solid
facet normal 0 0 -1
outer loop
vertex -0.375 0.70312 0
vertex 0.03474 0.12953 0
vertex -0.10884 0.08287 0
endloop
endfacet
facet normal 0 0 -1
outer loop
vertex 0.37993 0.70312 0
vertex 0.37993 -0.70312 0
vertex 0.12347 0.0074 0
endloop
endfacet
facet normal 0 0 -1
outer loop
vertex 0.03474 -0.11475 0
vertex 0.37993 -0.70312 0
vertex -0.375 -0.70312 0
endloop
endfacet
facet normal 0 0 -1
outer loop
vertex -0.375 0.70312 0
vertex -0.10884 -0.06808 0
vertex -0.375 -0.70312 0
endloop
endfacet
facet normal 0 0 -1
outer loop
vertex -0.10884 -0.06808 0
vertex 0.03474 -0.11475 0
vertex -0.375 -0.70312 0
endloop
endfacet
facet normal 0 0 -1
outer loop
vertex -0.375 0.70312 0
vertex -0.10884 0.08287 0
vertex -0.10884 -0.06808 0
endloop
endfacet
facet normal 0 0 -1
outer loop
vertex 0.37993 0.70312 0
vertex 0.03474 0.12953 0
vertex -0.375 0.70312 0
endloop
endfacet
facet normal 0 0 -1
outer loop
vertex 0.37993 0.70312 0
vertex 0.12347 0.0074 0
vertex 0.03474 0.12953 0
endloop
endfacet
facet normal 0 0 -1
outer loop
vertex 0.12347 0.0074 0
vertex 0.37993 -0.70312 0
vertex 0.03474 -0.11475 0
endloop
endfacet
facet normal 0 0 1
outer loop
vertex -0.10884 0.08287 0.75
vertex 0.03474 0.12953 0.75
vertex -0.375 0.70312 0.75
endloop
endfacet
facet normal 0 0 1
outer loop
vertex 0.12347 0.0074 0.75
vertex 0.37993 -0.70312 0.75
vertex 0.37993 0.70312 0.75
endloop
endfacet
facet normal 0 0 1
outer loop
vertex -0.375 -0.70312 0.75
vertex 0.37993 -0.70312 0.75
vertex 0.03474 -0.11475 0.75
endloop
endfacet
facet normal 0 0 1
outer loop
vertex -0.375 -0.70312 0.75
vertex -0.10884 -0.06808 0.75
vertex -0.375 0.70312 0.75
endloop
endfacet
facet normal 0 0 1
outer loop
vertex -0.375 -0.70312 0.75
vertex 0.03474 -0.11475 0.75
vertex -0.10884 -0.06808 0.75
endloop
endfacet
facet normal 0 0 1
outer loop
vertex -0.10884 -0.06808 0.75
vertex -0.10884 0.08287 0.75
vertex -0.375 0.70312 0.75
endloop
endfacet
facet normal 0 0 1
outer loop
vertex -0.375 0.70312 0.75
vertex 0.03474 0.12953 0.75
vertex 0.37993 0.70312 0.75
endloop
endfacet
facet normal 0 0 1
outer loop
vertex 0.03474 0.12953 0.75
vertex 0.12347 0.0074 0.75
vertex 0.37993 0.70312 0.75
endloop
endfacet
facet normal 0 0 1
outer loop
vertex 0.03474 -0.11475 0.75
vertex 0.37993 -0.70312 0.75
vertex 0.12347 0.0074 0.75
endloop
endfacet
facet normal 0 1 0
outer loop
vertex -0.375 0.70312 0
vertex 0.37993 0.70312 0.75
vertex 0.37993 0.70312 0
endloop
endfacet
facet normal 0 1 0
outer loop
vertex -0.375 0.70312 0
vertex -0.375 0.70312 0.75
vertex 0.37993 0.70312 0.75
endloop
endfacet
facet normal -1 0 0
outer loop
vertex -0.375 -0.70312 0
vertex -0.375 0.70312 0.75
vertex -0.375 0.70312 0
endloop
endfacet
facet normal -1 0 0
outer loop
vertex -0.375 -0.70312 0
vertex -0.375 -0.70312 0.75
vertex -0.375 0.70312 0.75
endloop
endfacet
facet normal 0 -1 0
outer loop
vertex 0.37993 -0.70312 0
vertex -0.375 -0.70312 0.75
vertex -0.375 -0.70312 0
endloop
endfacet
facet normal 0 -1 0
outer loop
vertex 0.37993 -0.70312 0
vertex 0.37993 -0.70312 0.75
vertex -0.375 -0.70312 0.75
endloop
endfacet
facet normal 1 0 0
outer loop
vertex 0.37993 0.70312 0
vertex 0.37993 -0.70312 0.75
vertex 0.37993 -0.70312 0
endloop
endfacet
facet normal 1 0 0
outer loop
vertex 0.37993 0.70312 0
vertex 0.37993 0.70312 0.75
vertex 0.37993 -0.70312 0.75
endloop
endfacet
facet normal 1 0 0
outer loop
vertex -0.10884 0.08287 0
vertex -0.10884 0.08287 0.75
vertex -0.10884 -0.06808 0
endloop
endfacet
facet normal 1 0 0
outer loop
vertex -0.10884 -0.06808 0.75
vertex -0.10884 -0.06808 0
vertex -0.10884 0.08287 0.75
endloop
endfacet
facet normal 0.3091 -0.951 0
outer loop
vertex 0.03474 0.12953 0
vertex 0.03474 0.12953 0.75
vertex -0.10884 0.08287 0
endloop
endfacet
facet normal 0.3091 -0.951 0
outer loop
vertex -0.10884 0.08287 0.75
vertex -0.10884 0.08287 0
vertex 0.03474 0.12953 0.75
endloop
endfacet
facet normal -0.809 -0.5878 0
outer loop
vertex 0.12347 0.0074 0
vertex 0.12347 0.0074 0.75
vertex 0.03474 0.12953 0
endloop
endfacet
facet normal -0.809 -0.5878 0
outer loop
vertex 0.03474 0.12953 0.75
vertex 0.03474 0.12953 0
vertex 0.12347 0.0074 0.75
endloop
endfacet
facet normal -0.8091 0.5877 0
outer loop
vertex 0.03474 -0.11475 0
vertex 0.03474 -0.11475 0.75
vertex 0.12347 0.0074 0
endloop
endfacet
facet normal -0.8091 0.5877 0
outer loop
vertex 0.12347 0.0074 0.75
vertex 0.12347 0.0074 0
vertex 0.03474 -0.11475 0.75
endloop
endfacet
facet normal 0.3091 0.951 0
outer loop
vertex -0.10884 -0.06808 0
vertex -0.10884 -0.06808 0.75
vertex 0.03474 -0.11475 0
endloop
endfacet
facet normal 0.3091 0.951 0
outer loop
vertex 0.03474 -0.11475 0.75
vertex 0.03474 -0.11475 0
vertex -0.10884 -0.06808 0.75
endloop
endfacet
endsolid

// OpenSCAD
EPS = 0.01;

translate([-0.375, -0.703125, 0.0])
linear_extrude(height=0.75)
difference() {
    union() {
        polygon(points=[[0.7549342105263157, 0.0], [0.7549342105263157, 1.40625], [0.0, 1.40625], [0.0, 0.0]]);
    }
    translate([0.3700657894736842, 0.7105263157894737])
    circle(r=0.11842105263157894 + EPS);
}
